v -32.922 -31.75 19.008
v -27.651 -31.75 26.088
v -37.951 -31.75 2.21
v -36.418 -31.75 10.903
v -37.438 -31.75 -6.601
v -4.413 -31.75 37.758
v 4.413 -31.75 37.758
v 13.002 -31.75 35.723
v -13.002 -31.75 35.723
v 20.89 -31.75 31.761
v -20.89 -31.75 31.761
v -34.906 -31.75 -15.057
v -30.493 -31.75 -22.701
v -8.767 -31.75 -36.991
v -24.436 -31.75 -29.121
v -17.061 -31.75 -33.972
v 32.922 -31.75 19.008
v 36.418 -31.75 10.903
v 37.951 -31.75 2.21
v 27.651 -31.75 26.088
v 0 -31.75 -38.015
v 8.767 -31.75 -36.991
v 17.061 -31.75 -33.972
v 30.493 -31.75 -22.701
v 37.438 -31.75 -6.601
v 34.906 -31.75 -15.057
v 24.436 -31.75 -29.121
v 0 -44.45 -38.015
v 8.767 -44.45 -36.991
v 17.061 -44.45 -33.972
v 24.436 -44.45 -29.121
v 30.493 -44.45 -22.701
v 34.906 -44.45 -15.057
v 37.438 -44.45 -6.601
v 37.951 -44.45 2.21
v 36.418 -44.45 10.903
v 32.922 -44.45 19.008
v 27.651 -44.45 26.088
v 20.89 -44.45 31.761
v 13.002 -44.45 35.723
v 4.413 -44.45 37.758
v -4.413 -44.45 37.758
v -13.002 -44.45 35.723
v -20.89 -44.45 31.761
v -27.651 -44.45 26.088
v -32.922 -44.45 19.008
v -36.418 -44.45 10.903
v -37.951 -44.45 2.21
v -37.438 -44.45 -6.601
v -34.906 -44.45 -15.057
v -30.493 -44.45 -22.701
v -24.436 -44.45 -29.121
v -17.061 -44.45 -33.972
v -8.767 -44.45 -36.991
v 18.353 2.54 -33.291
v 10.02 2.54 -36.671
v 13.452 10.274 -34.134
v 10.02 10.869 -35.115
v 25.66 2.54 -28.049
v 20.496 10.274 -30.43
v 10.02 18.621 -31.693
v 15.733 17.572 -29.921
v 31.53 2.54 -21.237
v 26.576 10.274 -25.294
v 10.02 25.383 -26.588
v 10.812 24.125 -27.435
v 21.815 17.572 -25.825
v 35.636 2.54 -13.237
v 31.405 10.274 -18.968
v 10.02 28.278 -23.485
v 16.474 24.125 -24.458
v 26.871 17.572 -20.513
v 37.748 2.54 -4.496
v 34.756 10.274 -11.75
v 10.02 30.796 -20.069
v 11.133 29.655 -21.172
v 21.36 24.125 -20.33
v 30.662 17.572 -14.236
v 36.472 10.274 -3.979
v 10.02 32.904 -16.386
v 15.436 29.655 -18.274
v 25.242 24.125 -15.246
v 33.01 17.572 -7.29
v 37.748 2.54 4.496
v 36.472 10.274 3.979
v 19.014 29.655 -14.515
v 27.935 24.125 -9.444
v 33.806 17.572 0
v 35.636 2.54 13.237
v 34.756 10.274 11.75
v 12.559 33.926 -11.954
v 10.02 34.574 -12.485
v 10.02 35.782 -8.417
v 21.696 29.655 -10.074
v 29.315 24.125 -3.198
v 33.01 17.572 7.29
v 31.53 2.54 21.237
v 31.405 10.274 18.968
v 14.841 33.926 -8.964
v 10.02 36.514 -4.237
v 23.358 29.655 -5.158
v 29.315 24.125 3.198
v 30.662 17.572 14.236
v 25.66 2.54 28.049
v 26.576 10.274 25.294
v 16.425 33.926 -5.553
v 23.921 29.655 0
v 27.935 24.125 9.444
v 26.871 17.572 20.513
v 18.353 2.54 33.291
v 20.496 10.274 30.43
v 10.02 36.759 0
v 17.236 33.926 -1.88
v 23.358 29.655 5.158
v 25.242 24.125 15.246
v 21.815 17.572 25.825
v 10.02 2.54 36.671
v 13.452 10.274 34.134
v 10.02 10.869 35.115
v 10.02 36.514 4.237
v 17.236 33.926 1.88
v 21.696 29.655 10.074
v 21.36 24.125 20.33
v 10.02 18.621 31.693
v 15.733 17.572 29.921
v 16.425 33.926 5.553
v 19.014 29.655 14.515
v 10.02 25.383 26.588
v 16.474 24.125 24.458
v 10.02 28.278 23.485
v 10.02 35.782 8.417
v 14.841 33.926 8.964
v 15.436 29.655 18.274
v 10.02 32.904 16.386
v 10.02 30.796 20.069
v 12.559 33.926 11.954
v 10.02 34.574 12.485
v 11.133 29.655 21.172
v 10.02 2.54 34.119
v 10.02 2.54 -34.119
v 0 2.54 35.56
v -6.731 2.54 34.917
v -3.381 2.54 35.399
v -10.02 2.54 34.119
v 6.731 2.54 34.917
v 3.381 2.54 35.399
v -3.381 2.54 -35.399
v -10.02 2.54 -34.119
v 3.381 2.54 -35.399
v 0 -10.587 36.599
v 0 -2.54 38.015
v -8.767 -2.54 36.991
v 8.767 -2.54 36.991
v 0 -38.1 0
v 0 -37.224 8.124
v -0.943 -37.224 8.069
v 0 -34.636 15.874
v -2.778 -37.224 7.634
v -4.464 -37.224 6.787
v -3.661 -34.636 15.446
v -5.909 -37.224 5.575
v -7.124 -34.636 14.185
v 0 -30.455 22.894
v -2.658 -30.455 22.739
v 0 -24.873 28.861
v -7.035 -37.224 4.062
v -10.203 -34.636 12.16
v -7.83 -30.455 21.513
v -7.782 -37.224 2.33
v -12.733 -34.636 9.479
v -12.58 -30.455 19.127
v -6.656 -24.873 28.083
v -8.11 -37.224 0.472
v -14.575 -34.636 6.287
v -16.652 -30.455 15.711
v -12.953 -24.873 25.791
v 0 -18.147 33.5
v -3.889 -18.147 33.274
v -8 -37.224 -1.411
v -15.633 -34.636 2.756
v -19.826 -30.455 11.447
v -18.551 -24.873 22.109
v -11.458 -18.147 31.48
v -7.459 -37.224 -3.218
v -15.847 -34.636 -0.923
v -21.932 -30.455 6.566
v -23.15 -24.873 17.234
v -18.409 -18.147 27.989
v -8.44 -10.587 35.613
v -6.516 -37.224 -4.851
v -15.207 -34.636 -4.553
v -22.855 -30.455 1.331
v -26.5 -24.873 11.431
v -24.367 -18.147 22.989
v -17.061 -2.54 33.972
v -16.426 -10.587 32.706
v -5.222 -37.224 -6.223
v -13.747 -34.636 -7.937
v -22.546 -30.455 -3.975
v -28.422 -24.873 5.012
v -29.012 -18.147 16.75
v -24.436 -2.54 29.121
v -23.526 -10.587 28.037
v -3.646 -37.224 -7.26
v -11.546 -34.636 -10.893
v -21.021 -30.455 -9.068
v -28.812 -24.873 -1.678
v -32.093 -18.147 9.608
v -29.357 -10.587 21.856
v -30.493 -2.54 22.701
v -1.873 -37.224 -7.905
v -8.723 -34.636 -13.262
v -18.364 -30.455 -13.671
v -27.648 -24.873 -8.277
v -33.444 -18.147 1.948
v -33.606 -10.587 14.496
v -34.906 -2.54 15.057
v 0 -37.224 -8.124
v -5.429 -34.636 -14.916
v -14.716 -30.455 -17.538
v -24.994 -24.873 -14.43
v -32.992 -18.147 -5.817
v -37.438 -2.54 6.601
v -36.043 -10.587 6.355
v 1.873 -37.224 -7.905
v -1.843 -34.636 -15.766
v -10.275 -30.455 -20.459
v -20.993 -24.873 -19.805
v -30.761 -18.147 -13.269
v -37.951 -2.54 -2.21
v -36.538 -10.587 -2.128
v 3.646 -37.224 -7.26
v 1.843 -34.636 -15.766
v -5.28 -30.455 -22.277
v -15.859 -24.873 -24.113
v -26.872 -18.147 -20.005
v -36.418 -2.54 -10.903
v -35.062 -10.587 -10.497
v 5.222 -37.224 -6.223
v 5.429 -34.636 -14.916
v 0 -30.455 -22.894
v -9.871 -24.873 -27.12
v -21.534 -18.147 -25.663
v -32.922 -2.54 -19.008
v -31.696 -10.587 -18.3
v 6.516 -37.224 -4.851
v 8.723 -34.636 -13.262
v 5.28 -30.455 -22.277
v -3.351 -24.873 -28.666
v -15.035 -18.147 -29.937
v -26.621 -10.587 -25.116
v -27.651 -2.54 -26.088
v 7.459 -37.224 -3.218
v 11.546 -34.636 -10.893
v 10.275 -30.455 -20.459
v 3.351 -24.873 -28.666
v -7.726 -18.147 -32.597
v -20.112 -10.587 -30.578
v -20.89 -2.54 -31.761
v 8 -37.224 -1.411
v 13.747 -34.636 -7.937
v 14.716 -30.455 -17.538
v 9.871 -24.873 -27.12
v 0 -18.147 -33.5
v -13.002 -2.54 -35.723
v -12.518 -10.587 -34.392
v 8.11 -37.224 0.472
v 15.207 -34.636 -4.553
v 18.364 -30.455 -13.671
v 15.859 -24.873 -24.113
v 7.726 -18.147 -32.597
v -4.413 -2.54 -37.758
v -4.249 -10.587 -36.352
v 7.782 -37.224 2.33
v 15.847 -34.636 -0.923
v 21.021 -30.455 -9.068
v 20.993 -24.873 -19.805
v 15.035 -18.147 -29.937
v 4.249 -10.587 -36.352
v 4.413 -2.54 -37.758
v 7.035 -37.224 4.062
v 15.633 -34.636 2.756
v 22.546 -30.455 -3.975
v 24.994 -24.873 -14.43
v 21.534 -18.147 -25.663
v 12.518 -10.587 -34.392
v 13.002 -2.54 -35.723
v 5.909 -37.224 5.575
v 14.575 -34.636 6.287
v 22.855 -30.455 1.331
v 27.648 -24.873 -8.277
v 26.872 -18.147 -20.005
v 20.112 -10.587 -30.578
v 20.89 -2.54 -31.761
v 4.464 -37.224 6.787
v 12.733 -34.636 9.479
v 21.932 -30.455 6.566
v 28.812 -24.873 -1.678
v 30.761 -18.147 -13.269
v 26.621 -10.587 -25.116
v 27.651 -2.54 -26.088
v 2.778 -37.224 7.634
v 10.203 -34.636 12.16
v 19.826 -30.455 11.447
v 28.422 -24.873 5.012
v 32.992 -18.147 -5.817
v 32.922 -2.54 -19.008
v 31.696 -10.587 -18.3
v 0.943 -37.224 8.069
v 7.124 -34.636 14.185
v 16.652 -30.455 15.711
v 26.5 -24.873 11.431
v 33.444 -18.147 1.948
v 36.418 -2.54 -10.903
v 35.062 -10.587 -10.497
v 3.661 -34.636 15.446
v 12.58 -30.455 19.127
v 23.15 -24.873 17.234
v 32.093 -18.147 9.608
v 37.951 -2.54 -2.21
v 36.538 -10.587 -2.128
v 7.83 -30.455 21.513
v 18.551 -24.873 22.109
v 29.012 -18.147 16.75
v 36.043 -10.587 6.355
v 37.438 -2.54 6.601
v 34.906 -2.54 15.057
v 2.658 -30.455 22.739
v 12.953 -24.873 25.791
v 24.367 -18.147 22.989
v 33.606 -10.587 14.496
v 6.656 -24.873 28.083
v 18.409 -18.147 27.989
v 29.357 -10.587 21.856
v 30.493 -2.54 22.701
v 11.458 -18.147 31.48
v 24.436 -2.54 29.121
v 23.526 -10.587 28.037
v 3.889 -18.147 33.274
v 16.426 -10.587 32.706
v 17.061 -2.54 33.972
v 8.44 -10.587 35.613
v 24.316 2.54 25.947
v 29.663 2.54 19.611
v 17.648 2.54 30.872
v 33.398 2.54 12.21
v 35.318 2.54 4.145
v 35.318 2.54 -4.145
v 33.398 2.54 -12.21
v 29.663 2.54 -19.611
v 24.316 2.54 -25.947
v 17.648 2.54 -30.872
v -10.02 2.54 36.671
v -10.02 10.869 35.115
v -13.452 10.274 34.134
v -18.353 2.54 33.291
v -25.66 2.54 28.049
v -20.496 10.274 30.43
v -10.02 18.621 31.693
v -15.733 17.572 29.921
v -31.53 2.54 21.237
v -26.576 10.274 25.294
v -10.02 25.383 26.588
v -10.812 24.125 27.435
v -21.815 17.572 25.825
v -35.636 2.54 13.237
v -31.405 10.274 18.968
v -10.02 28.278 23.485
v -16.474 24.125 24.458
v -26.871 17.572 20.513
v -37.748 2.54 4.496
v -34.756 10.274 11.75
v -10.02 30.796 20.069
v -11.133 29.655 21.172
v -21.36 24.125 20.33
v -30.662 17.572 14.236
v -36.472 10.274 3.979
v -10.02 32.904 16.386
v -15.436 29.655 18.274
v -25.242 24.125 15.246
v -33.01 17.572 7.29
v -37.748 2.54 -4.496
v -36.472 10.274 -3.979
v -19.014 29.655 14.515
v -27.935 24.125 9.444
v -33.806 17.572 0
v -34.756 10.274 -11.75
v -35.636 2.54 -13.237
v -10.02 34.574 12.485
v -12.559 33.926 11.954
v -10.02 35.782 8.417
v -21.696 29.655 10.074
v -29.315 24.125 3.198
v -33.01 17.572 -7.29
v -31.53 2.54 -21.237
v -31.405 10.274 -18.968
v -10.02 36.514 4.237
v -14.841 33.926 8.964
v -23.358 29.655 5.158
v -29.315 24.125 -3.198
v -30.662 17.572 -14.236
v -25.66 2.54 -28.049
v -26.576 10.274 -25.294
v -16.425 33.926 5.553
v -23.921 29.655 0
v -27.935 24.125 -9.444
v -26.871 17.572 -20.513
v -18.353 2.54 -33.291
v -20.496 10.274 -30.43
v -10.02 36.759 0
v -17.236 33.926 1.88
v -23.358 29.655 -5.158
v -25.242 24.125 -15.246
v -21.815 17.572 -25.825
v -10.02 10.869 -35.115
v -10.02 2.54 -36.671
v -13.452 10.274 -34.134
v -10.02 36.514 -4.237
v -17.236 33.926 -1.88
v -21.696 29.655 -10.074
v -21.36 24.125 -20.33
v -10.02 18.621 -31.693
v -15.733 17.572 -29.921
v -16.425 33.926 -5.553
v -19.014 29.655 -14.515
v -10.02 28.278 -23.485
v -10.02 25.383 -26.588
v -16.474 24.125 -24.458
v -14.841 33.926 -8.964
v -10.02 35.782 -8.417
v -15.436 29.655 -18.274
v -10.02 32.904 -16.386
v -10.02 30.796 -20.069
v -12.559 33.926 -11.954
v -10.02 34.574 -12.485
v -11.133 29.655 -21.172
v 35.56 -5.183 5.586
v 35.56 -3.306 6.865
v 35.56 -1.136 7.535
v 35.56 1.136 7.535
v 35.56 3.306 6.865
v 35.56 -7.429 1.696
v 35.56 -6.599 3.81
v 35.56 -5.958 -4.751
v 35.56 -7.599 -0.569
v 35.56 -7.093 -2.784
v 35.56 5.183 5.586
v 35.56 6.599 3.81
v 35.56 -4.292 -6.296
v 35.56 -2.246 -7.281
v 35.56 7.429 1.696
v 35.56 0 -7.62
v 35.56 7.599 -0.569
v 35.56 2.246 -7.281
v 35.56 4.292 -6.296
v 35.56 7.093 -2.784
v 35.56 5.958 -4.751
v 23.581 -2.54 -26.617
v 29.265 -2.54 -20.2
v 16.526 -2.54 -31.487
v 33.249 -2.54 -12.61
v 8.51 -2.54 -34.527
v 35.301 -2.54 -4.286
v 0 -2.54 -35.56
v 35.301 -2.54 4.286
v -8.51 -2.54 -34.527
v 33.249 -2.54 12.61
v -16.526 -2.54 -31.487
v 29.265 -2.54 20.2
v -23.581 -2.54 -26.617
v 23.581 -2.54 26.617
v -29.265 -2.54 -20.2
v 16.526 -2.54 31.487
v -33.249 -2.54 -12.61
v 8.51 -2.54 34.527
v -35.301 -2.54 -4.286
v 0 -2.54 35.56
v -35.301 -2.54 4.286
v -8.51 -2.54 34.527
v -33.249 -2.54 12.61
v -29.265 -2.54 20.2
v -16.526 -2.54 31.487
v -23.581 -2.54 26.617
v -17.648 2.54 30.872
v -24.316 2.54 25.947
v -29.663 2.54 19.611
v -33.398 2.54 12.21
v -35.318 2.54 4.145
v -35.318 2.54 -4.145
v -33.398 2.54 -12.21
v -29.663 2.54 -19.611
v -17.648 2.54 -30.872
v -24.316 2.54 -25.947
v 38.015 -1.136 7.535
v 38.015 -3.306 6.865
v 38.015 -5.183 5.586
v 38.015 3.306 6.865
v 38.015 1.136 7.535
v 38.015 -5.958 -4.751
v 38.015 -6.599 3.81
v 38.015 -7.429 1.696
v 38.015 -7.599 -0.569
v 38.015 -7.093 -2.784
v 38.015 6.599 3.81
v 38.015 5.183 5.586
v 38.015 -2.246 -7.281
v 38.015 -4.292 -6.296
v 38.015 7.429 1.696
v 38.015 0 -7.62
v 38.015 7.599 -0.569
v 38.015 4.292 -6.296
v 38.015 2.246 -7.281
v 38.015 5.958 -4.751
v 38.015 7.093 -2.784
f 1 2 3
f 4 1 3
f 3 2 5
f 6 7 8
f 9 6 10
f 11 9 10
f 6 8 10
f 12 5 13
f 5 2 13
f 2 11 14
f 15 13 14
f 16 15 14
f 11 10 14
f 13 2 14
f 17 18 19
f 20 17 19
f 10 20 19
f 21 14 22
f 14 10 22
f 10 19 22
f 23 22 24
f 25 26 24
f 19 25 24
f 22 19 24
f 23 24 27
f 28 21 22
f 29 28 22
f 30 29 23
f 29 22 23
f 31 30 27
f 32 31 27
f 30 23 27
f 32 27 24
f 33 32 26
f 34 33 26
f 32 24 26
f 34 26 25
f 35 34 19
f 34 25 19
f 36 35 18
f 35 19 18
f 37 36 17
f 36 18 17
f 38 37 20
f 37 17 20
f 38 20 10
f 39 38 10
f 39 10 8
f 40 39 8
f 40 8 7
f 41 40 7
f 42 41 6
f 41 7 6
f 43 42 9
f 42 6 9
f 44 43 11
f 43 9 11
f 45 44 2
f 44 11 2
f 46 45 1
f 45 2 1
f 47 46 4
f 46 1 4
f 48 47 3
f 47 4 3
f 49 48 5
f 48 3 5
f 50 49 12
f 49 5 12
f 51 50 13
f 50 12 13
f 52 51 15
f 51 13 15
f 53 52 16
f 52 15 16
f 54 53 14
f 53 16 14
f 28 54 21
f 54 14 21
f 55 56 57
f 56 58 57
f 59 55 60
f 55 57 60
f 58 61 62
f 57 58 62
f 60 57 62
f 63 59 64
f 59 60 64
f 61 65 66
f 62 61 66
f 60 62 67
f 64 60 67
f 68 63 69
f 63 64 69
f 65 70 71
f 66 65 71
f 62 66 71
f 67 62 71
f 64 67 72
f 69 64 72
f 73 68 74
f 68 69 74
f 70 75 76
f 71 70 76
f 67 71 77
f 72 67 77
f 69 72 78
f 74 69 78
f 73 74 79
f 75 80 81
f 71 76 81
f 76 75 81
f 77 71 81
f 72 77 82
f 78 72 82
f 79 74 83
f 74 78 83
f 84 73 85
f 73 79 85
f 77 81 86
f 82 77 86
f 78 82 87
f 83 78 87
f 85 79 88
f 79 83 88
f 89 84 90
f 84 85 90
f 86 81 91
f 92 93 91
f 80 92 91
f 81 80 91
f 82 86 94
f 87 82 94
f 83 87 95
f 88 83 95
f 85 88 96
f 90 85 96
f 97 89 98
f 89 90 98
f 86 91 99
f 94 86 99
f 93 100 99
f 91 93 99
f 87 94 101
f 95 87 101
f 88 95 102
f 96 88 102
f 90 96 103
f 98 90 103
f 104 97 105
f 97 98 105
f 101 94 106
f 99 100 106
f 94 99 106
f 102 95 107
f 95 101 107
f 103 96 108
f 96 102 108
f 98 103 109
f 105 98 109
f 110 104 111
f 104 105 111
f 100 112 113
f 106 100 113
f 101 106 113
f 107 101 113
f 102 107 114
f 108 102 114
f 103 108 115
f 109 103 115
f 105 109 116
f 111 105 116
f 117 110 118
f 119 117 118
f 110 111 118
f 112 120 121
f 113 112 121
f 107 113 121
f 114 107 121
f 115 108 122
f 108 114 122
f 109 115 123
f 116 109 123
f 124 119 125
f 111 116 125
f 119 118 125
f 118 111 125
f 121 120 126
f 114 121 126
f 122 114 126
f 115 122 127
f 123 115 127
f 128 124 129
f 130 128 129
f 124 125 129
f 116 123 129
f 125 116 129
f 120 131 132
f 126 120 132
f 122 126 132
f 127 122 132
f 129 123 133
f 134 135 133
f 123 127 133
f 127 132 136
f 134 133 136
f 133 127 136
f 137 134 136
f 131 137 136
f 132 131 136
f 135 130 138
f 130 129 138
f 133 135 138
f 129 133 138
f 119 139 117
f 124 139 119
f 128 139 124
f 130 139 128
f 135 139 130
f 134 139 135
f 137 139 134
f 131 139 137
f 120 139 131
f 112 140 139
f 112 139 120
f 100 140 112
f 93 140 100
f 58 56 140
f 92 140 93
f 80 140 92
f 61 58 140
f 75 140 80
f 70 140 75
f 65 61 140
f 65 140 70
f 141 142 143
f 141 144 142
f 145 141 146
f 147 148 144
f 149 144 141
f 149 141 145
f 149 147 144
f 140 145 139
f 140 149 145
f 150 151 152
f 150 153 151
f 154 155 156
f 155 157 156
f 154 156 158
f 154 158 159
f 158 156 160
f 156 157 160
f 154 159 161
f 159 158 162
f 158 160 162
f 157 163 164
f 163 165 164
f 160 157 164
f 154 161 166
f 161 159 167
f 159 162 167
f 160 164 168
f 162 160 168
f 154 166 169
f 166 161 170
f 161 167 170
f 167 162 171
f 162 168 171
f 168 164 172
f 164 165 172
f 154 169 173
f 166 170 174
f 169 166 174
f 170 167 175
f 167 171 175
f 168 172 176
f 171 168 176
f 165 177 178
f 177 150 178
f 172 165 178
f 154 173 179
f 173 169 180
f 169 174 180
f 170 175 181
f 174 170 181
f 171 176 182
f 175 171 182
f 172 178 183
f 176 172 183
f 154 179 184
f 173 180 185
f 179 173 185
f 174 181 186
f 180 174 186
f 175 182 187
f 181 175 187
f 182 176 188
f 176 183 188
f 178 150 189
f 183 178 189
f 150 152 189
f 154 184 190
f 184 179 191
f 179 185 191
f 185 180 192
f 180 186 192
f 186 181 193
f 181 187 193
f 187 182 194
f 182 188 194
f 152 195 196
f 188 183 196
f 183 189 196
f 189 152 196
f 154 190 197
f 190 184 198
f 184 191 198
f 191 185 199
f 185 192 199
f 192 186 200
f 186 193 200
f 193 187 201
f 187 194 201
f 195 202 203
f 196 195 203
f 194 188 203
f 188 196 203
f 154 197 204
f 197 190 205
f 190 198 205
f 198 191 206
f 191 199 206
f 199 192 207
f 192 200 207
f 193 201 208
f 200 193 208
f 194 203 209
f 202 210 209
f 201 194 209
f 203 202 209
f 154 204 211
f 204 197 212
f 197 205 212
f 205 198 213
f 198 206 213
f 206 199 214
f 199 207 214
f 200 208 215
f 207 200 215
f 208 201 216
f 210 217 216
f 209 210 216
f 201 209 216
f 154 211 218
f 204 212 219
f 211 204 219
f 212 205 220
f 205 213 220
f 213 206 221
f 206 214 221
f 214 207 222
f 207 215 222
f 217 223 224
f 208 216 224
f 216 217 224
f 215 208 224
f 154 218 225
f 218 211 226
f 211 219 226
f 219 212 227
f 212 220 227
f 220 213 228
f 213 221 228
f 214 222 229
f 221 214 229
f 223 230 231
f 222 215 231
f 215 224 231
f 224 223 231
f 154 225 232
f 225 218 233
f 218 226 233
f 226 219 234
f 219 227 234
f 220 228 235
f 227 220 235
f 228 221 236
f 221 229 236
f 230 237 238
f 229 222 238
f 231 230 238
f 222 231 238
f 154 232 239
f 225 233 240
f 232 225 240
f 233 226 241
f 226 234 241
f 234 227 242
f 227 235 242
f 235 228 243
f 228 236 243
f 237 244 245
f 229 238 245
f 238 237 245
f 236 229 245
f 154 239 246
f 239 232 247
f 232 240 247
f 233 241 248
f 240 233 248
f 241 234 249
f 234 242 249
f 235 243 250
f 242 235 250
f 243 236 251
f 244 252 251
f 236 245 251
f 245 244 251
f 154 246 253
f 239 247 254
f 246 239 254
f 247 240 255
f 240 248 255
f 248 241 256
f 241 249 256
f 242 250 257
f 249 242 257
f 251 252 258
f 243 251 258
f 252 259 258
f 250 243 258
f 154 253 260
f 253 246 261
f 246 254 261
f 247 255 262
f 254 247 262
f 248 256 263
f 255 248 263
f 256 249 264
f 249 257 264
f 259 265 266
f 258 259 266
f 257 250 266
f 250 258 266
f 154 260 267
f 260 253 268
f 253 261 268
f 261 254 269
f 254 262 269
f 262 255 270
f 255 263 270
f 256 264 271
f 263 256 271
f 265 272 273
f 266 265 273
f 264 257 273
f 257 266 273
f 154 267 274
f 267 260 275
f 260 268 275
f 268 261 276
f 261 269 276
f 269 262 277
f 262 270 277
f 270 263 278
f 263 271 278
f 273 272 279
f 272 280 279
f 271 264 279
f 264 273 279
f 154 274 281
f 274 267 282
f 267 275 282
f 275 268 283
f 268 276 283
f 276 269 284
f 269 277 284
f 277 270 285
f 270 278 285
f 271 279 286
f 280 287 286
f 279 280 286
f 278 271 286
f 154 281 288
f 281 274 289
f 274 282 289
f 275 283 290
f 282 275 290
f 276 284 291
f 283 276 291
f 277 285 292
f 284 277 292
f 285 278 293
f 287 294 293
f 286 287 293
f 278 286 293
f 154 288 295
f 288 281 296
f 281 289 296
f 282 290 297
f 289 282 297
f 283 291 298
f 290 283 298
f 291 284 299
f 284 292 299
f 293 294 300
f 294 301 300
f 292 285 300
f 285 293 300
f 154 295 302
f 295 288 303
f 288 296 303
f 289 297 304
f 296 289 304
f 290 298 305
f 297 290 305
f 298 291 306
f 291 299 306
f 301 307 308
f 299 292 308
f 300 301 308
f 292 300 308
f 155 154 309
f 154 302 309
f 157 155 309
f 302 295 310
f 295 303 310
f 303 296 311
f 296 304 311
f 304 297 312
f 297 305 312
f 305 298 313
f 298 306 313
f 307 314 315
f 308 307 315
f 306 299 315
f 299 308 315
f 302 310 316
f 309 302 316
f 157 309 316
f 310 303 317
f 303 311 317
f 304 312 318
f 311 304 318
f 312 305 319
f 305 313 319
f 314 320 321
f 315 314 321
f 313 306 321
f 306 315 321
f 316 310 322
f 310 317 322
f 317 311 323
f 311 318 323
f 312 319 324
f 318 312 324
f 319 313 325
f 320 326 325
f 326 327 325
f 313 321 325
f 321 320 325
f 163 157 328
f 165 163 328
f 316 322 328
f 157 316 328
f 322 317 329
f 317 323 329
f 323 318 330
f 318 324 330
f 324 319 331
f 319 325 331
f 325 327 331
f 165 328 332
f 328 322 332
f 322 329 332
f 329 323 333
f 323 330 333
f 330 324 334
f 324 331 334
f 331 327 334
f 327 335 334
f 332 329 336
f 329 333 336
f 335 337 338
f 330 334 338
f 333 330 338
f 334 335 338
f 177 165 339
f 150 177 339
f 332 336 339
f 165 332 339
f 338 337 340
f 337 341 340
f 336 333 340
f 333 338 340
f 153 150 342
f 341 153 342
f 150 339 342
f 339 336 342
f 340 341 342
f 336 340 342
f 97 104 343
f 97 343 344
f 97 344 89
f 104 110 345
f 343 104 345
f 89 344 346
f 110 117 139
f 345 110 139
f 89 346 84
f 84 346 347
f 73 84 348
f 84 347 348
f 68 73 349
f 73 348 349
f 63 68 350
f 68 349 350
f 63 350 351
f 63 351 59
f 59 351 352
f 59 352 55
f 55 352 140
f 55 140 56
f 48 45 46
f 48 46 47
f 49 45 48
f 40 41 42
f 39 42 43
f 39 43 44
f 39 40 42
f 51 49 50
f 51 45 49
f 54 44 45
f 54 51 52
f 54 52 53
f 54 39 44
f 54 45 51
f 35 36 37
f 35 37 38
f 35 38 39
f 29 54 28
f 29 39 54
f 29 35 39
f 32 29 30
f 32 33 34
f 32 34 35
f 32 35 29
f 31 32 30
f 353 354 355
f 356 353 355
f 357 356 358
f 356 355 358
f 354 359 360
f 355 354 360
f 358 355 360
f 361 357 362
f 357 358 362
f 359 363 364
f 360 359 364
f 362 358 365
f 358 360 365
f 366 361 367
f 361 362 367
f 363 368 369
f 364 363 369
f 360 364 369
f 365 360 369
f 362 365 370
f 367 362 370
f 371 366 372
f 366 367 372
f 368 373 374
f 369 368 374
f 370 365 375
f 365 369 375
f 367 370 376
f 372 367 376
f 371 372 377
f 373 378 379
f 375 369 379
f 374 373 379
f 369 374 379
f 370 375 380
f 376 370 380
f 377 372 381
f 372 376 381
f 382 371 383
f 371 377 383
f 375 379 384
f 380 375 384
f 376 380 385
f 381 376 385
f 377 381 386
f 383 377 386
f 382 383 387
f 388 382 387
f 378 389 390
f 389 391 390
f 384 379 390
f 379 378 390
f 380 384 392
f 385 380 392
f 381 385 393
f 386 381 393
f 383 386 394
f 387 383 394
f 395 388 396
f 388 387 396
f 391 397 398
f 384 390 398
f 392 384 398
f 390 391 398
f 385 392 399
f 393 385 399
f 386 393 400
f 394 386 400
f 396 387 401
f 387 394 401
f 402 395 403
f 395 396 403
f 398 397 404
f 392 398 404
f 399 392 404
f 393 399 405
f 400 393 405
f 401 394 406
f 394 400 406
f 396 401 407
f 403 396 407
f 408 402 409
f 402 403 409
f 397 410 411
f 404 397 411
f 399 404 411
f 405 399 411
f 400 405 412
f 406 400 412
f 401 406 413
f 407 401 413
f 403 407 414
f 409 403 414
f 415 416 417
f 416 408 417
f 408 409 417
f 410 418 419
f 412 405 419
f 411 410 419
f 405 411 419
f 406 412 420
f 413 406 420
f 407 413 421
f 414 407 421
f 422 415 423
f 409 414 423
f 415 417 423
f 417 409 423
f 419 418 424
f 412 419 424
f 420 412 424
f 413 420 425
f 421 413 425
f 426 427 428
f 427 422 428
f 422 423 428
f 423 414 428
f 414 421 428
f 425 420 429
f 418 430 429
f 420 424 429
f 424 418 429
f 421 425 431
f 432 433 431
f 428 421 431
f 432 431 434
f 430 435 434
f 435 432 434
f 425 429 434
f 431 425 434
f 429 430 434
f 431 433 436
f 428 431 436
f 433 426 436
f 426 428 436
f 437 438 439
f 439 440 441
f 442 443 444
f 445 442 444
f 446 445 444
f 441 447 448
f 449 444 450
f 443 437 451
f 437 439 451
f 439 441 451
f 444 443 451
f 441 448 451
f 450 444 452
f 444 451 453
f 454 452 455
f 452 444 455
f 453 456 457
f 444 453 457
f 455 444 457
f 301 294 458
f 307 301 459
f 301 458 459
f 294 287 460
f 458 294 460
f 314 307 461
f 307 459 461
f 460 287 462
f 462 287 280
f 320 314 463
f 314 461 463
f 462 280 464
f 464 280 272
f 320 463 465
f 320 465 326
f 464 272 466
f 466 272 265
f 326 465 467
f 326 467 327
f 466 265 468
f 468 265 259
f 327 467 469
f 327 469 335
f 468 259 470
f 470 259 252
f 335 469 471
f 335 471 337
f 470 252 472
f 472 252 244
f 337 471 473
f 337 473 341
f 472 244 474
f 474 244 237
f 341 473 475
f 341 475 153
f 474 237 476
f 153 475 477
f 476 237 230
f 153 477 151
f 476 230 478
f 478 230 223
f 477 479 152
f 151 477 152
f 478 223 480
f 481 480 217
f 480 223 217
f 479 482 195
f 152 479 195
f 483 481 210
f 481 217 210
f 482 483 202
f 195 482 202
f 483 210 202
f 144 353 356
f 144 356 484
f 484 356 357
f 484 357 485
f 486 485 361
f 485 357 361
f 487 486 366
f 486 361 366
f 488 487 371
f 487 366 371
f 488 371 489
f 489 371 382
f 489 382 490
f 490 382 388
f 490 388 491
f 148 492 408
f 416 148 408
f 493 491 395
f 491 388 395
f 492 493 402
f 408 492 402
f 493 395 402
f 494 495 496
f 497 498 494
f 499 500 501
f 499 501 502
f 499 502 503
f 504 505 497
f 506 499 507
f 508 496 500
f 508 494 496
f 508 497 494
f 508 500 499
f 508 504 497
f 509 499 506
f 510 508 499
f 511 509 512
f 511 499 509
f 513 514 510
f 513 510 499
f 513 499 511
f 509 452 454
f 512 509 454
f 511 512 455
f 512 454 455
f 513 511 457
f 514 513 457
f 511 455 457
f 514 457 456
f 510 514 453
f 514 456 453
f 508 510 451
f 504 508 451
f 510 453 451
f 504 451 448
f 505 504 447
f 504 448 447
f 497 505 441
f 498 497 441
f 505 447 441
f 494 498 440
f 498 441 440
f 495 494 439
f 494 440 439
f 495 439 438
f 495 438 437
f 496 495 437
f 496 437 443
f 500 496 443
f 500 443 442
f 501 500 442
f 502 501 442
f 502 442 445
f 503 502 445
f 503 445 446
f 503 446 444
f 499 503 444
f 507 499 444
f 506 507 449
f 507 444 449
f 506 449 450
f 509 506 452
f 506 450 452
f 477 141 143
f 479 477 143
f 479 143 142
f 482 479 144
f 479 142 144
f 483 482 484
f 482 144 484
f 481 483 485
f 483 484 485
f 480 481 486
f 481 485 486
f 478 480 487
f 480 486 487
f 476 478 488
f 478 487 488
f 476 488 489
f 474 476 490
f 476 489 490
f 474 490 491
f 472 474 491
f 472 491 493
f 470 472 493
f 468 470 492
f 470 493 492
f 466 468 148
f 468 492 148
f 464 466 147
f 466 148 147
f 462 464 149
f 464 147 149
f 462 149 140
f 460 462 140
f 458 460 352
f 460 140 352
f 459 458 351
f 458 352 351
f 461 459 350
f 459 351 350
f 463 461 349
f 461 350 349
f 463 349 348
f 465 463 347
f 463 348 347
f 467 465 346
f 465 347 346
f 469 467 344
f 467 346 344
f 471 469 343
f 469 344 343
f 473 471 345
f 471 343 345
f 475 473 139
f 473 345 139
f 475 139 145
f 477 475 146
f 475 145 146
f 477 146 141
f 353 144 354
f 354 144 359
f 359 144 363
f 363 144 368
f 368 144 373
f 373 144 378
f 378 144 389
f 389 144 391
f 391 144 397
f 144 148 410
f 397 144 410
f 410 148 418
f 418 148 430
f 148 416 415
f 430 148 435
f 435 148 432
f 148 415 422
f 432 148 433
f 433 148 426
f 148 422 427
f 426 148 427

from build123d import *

# Parameters (mm, degrees)
SKETCH4_R                = 7.62
BOSS_EXTRUDE3_DEPTH      = 2.455239
CUT_EXTRUDE1_DEPTH       = 66.893298597
CUT_EXTRUDE1_DEPTH_BACK  = 66.893298597
SKETCH5_W                = 20.0406
SKETCH5_H                = 35.56
BOSS_EXTRUDE4_DEPTH      = 6.35
BOSS_EXTRUDE4_DEPTH_BACK = 6.35
SKETCH6_R                = 38.01523905


with BuildPart() as part:
    # Sketch1 → Revolve1 (revolve)
    with BuildSketch(Plane.XY, mode=Mode.PRIVATE) as revolve1_sk:
        with BuildLine():
            Line((0, 38.1), (0, -38.1))
            ThreePointArc((0, -38.1), (-26.027254946, -27.824305921), (-38.01523905, -2.54))
            Line((-38.01523905, -2.54), (-35.56, -2.54))
            Line((-35.56, -2.54), (-35.56, 2.54))
            Line((-35.56, 2.54), (-38.01523905, 2.54))
            ThreePointArc((-38.01523905, 2.54), (-26.027254946, 27.824305921), (0, 38.1))
        make_face()
    revolve(revolve1_sk.sketch.rotate(Axis((0, 38.1, 0), (0, -1, 0)), 270), axis=Axis((0, 38.1, 0), (0, -1, 0)))

    # Sketch5 → Cut-Extrude1 (cut, two sides: drawn at the far end of the back side and taken through both)
    with BuildSketch(Plane.XY.offset(-CUT_EXTRUDE1_DEPTH_BACK)):
        with Locations((0, 20.32)):
            Rectangle(SKETCH5_W, SKETCH5_H)
    extrude(amount=CUT_EXTRUDE1_DEPTH + CUT_EXTRUDE1_DEPTH_BACK, mode=Mode.SUBTRACT)


with BuildPart() as body_2:
    # Sketch4 → Boss-Extrude3 (new, through all)
    with BuildSketch(Plane(origin=(35.56, 0, 0), x_dir=(0, 0, -1), z_dir=(1, 0, 0))):
        Circle(SKETCH4_R)
    extrude(amount=BOSS_EXTRUDE3_DEPTH)


with BuildPart() as body_3:
    # Sketch6 → Boss-Extrude4 (new, two sides: drawn at the far end of the back side and taken through both)
    with BuildSketch(Plane(origin=(0, -38.1, 0), x_dir=(-1, 0, 0), z_dir=(0, -1, 0)).offset(-BOSS_EXTRUDE4_DEPTH_BACK)):
        with Locations(Location((0, 0, 0), (0, 0, 90))):
            Circle(SKETCH6_R)
    extrude(amount=BOSS_EXTRUDE4_DEPTH + BOSS_EXTRUDE4_DEPTH_BACK)


solid = Compound([part.part, body_2.part, body_3.part])
